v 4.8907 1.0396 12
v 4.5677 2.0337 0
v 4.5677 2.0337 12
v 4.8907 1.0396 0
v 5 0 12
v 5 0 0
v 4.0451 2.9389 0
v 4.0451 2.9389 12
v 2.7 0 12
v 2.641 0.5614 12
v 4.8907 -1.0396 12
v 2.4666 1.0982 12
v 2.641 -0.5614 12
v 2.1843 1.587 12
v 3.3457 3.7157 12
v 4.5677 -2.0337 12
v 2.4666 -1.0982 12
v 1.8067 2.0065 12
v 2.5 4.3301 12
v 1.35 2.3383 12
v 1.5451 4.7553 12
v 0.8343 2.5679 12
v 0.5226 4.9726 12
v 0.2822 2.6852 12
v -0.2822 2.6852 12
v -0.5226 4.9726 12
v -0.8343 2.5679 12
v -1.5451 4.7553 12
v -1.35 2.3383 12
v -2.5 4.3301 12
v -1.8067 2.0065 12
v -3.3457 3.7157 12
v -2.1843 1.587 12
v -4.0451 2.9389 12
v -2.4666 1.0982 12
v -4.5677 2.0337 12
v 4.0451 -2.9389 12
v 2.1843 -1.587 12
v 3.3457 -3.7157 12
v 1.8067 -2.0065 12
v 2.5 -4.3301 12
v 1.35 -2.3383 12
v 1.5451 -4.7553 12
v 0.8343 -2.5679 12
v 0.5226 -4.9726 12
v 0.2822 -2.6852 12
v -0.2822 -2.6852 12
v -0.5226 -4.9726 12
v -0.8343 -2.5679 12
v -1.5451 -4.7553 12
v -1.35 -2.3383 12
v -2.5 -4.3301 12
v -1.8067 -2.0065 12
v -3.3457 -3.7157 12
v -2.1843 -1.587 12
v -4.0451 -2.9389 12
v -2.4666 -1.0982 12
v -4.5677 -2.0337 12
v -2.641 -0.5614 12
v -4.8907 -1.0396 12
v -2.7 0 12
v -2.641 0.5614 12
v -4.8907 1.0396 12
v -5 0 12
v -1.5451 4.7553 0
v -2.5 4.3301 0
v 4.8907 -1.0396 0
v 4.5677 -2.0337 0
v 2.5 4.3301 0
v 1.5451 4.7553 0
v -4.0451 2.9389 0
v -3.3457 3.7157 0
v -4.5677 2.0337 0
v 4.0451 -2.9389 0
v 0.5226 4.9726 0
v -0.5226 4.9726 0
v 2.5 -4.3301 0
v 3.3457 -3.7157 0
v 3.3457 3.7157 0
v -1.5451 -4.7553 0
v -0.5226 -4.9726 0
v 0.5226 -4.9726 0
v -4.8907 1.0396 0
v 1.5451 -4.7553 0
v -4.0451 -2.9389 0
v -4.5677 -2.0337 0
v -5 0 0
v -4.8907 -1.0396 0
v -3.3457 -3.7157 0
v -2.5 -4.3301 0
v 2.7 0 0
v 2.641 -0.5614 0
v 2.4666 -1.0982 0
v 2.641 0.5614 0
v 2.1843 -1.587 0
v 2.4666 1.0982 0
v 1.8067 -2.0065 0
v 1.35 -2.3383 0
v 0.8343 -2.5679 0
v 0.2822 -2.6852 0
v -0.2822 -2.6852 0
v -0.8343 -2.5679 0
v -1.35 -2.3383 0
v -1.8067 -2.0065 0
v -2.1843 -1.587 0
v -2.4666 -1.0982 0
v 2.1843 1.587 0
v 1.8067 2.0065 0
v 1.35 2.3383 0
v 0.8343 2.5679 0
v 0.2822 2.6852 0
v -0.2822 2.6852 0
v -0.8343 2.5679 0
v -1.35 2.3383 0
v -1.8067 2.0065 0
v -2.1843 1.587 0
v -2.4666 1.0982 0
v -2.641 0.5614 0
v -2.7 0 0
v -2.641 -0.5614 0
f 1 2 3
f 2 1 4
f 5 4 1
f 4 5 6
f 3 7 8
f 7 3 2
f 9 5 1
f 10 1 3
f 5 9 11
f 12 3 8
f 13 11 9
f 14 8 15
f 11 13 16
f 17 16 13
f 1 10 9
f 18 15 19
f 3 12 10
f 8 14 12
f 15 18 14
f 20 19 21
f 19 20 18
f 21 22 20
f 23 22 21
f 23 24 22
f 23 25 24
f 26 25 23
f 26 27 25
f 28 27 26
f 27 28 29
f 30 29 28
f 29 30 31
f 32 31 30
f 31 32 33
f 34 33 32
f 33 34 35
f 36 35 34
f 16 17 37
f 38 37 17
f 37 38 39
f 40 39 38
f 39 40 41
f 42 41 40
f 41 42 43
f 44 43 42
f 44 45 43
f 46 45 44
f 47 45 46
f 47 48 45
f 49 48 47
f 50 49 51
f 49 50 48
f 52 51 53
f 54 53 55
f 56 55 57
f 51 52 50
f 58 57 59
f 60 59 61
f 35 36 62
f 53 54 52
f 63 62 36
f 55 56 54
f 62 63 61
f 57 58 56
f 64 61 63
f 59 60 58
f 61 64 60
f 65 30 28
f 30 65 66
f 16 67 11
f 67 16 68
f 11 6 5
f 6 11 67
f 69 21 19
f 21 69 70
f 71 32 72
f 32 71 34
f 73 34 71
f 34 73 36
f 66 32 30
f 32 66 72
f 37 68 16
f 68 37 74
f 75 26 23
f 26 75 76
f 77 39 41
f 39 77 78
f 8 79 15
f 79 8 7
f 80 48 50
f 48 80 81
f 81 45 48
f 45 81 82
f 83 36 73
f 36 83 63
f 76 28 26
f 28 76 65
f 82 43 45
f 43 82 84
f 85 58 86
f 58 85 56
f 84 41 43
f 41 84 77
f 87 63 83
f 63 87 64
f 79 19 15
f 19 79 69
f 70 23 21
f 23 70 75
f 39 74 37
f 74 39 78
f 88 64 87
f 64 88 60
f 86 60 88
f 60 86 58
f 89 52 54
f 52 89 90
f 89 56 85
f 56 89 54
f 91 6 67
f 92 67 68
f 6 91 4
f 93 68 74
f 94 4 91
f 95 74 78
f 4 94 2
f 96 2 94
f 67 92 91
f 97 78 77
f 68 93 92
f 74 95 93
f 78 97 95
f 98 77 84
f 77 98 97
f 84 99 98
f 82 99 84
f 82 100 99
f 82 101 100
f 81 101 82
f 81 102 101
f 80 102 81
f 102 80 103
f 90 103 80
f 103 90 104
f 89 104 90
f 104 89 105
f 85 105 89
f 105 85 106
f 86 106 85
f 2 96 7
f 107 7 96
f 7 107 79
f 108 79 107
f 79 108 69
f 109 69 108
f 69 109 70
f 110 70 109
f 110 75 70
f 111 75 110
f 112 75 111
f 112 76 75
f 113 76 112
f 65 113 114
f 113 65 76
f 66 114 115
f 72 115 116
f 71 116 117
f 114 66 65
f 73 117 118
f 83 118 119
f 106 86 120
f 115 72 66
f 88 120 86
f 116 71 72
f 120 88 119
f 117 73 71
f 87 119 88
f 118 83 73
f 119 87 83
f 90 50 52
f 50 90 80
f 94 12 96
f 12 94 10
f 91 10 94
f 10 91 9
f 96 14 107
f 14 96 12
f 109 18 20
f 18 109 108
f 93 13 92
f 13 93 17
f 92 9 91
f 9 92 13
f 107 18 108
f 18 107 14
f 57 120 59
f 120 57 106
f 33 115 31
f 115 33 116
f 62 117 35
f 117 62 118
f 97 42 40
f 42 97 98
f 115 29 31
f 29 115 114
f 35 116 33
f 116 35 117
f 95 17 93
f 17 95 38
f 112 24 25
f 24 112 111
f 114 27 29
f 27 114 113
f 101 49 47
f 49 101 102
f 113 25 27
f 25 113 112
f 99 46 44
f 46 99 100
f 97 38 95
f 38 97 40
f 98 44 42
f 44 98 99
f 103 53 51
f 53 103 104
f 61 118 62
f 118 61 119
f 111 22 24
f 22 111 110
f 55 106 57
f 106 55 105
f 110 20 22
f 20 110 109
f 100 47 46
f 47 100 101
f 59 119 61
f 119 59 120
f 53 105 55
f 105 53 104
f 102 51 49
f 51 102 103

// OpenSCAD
PULLEY_MOUNT_DIA = 5.4;
PULLEY_SHAFT_LEN = 12;
PULLEY_SHAFT_DIA = 10;

$fn = 30;

module pulley_shaft_pos() {
    cylinder(d = PULLEY_SHAFT_DIA, h = PULLEY_SHAFT_LEN);
}

module pulley_shaft_neg() {
    cylinder(d = PULLEY_MOUNT_DIA, h = PULLEY_SHAFT_LEN);
}

difference() {
    pulley_shaft_pos();
    pulley_shaft_neg();
}
